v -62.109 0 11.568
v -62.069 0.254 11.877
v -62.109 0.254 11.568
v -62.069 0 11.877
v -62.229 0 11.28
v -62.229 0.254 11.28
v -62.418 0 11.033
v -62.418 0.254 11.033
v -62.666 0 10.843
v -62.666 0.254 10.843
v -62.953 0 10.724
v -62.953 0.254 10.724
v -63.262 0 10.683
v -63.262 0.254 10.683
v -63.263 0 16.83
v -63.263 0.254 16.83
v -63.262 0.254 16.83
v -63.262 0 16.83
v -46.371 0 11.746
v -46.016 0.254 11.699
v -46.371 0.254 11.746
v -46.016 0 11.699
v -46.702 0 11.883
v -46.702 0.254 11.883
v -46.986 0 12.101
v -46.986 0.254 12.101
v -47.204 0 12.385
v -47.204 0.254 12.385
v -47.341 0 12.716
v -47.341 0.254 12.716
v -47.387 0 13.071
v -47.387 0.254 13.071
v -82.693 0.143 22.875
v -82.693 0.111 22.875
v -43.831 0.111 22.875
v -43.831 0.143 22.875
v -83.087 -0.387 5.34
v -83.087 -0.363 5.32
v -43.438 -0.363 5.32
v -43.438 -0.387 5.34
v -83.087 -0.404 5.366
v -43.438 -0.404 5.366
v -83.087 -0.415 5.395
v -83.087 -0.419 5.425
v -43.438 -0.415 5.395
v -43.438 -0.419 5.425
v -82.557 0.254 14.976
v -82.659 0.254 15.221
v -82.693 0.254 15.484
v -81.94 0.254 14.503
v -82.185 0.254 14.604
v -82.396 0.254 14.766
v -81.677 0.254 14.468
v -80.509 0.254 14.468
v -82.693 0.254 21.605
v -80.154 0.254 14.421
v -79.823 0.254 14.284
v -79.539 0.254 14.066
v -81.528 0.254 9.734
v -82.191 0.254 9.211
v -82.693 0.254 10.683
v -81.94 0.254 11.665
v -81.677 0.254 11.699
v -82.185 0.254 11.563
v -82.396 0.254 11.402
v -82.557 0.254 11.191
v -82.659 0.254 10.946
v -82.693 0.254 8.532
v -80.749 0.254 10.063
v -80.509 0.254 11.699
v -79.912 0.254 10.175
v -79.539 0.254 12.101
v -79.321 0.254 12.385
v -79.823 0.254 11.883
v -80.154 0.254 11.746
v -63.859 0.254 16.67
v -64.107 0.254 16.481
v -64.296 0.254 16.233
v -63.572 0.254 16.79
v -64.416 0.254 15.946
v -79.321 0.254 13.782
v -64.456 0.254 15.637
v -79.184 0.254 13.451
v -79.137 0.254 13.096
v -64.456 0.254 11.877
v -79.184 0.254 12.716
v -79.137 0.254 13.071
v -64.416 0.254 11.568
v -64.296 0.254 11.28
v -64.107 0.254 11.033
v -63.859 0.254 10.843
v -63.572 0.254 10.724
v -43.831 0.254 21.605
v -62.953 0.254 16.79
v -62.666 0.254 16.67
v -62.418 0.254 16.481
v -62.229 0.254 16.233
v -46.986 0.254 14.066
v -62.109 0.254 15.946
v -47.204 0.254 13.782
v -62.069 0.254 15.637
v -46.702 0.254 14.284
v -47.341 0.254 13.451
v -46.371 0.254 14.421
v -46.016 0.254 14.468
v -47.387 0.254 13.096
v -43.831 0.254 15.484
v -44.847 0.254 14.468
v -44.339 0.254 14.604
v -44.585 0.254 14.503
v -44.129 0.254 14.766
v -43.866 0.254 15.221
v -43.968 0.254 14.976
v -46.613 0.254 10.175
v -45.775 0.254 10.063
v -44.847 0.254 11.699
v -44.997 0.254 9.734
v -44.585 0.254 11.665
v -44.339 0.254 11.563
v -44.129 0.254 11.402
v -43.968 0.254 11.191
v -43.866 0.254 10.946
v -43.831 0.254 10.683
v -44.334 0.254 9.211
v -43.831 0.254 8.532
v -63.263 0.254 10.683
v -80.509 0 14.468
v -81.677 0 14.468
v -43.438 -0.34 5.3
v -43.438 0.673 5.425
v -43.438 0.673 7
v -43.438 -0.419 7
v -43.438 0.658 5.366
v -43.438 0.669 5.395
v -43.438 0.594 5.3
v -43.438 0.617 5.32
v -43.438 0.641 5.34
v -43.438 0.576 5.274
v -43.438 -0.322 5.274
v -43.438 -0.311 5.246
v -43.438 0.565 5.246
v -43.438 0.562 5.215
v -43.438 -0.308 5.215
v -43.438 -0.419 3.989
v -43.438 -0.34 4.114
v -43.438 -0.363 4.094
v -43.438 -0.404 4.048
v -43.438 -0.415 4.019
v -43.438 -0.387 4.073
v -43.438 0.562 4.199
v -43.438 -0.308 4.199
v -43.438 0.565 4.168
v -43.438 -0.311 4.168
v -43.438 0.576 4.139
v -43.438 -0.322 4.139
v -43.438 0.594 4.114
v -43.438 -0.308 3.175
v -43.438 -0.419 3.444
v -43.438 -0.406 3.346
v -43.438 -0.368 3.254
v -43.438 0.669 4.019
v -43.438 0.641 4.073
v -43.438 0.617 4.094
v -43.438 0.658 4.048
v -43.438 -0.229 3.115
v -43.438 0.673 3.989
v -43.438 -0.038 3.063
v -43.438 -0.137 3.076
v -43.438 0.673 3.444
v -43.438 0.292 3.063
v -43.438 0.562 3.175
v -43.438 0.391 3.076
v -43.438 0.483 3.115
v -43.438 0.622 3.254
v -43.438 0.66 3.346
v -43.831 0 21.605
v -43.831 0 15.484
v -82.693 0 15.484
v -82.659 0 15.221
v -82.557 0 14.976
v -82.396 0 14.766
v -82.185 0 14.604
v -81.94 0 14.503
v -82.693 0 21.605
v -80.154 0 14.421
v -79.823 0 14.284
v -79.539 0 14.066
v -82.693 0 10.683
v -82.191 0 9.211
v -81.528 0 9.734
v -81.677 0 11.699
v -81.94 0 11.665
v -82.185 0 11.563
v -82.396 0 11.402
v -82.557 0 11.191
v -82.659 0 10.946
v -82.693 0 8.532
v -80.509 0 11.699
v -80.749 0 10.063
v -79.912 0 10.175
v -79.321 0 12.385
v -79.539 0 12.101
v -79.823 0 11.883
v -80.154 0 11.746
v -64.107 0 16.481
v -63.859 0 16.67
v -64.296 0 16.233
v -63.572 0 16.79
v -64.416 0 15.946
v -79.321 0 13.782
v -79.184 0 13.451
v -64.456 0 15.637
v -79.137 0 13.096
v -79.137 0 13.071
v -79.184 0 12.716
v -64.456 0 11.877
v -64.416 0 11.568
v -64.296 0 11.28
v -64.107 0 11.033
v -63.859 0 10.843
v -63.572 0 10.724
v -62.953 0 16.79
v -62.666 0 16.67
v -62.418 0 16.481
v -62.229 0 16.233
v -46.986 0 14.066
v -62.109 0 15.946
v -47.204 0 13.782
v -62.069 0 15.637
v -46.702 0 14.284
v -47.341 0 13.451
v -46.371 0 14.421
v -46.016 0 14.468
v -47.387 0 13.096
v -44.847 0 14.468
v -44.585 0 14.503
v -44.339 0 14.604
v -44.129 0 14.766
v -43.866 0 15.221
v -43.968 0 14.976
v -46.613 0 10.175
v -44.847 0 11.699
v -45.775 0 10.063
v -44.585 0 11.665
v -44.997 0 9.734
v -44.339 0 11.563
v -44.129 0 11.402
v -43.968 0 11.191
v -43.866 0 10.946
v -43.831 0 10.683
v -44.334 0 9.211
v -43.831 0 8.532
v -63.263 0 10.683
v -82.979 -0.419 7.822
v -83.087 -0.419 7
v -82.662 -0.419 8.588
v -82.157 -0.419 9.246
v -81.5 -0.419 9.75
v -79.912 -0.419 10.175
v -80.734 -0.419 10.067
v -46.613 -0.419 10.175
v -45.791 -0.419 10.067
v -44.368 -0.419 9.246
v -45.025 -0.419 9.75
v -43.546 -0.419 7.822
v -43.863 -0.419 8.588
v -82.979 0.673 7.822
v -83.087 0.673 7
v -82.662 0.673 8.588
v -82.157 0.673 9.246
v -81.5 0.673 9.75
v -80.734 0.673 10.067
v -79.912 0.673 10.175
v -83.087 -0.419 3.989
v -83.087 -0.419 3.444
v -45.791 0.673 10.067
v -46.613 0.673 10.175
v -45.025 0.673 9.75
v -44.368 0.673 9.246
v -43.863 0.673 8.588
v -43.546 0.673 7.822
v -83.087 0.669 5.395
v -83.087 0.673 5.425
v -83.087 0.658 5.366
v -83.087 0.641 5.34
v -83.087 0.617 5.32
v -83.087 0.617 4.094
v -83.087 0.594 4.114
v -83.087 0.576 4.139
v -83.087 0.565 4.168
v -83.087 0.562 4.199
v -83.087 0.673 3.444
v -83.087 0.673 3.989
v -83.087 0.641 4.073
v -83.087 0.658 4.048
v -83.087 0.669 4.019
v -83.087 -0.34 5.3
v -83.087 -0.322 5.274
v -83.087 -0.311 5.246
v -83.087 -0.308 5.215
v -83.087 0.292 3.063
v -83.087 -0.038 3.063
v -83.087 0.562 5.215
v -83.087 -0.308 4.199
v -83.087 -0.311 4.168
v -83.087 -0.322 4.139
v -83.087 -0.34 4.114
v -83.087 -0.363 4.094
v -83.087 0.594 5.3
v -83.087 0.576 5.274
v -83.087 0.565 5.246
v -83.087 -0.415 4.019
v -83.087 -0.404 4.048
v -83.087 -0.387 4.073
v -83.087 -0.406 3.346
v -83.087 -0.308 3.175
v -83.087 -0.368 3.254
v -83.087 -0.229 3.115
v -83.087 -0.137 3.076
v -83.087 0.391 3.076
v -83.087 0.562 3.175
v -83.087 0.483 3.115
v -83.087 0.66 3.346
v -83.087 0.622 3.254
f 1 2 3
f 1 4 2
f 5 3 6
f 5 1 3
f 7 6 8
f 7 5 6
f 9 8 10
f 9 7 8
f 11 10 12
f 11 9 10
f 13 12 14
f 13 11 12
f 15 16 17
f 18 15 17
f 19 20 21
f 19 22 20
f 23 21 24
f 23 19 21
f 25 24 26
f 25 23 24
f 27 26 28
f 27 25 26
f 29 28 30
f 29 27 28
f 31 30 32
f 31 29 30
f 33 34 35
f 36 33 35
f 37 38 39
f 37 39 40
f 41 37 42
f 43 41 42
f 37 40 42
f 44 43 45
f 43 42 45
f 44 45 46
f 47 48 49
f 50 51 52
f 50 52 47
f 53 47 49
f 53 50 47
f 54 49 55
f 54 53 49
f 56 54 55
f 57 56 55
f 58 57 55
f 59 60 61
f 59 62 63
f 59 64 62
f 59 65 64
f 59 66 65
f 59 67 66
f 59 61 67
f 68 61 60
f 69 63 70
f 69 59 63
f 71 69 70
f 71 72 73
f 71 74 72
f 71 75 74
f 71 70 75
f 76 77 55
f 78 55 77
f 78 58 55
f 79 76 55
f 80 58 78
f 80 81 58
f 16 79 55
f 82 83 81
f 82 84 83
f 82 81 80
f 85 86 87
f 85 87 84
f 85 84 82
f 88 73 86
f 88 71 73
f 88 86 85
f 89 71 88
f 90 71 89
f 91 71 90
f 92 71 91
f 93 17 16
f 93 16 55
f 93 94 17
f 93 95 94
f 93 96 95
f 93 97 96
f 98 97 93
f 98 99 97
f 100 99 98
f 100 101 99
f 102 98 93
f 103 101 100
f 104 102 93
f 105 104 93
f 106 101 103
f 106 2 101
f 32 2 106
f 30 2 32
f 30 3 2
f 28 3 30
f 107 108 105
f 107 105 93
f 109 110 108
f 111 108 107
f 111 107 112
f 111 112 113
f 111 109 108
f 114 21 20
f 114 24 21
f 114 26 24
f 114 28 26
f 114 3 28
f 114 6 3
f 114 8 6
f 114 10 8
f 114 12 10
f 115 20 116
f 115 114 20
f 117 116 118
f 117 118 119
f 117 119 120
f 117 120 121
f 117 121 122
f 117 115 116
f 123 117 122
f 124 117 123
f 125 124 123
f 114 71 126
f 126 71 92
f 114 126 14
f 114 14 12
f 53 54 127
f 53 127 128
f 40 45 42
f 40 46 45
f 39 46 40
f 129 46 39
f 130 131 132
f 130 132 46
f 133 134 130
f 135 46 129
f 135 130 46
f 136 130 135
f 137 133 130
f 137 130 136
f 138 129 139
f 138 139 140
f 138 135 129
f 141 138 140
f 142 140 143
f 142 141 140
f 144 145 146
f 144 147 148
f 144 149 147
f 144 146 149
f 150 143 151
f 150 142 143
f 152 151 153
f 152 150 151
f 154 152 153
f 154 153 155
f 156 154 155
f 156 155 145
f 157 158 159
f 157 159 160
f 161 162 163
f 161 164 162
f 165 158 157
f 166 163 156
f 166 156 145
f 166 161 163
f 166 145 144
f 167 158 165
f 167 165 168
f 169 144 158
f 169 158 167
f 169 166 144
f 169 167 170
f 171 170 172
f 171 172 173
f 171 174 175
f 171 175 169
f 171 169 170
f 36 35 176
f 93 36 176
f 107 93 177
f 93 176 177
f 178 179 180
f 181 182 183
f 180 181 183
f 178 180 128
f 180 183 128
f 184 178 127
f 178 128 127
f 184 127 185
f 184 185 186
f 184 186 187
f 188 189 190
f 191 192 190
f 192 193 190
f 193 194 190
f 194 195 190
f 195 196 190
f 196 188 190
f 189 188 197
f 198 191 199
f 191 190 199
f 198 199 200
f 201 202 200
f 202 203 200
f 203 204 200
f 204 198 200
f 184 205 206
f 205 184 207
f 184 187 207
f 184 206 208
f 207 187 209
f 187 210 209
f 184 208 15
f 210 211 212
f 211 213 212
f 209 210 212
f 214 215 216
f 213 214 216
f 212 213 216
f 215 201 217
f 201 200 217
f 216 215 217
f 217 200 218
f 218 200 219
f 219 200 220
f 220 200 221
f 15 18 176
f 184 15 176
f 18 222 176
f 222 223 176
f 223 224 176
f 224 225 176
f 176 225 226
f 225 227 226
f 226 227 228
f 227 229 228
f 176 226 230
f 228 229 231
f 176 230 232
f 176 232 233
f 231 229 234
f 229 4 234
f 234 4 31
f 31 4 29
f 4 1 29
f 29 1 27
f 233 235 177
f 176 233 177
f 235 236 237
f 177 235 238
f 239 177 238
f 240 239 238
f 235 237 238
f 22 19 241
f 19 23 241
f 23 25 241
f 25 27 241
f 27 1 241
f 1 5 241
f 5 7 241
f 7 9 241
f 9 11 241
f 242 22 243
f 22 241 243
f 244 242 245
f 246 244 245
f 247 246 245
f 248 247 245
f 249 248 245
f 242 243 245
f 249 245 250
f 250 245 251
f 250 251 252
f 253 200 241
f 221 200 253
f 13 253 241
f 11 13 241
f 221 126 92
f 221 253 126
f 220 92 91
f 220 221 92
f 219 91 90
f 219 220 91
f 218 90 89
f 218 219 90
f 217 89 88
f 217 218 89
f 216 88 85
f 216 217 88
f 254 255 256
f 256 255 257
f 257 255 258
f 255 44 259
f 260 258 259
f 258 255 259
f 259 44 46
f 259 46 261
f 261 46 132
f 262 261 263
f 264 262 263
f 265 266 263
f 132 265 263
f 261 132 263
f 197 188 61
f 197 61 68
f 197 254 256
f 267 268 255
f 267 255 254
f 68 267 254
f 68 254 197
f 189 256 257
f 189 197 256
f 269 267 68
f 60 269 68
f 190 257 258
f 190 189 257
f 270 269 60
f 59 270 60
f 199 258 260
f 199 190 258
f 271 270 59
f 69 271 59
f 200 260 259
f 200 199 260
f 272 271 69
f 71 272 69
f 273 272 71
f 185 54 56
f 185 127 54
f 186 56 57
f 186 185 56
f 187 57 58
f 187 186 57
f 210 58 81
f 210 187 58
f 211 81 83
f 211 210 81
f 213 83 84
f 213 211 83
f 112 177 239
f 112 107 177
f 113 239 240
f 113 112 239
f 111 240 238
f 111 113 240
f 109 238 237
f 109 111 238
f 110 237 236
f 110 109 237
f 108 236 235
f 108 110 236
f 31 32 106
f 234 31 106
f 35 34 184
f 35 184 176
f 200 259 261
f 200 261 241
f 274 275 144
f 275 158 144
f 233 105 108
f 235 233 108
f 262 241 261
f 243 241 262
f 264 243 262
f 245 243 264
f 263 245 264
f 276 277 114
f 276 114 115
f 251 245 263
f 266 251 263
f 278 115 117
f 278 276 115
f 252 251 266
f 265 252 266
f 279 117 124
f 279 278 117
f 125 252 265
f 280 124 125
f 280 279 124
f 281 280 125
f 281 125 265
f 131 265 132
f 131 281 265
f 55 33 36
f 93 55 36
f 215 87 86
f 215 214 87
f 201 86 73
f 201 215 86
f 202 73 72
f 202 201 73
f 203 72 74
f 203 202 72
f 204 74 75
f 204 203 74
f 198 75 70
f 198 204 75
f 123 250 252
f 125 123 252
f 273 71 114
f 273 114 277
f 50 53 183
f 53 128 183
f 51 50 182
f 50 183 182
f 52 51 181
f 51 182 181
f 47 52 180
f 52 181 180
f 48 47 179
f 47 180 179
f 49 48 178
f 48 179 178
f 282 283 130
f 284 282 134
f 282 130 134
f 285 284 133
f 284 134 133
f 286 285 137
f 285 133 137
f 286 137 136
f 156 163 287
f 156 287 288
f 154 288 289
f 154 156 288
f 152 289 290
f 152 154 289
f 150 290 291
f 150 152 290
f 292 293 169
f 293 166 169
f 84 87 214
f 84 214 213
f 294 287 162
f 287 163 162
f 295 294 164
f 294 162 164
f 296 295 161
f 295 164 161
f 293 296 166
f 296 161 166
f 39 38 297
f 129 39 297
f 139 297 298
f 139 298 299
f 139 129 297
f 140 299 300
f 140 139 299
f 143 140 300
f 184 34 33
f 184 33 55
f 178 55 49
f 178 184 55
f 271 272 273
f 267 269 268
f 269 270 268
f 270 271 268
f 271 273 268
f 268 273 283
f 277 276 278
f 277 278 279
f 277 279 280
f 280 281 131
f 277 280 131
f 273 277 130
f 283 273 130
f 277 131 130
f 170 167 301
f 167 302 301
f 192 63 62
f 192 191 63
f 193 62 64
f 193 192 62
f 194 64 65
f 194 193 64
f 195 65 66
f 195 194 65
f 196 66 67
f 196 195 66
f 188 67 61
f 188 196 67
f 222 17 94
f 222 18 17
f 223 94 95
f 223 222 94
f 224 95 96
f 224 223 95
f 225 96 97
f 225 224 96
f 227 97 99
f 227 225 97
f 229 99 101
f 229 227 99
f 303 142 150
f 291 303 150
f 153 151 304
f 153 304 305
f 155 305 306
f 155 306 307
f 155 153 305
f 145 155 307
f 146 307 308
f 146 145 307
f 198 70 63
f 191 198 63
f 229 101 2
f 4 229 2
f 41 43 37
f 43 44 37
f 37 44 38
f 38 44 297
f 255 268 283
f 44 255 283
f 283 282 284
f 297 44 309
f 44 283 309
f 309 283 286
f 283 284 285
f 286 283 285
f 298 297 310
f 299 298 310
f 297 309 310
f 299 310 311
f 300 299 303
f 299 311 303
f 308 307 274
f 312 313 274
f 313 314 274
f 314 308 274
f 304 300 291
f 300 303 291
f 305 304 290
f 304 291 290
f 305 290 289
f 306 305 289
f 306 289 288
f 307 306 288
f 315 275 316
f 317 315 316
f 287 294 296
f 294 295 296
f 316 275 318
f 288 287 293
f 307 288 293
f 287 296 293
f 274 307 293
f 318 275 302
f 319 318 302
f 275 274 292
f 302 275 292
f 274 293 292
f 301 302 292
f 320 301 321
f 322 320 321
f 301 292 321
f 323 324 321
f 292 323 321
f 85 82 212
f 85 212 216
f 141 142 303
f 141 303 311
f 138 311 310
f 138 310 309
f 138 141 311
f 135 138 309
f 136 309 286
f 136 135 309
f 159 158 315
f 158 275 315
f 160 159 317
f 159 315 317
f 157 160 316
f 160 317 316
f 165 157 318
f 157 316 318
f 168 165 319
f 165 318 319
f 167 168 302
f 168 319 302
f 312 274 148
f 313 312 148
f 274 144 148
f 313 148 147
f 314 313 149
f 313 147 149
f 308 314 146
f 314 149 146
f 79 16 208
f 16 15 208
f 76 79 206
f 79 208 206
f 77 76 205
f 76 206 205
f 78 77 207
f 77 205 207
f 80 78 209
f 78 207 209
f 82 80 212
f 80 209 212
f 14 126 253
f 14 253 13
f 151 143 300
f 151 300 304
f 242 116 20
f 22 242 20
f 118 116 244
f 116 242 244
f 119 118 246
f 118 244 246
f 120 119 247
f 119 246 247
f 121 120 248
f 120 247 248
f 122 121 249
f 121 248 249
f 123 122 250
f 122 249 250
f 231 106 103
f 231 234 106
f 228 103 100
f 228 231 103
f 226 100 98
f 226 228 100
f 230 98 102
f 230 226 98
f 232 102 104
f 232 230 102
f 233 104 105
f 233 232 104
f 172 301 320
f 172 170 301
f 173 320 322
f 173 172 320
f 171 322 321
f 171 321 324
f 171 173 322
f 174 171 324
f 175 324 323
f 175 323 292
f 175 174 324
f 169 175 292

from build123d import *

# Parameters (mm, degrees)
SKETCH1_W           = 38.862
SKETCH1_H           = 19.812
BOSS_EXTRUDE1_DEPTH = 0.254
CHAMFER1_SIZE       = 1.27
CHAMFER1_SIZE2      = 0.111110603
CHAMFER2_SIZE       = 1.27
CHAMFER2_SIZE2      = 0.111110603
SKETCH2_W           = 38.862
SKETCH2_H           = 7.112
BOSS_EXTRUDE2_DEPTH = 1.0922
MOVE_FACE1_BY       = 0.3937
MOVE_FACE1_2_BY     = 0.3937
FILLET1_R           = 3.175
FILLET2_R           = 0.381
SKETCH3_W           = 1.27
SKETCH3_H           = 0.642734604
CUT_EXTRUDE1_DEPTH  = 46.780069848
FILLET3_R           = 0.127
FILLET4_R           = 0.127
CUT_EXTRUDE2_DEPTH  = 87.18132095
FILLET5_R           = 1.3716
FILLET6_R           = 1.016
SKETCH5_W           = 2.3876
SKETCH5_H           = 6.1468
CUT_EXTRUDE3_DEPTH  = 87.18132095
FILLET7_R           = 1.1938


# Some blends are built 0.0001 mm under size
with BuildPart() as part:
    # Sketch1 → Boss-Extrude1 (new body)
    with BuildSketch(Plane(origin=(0, 0, 0), x_dir=(1, 0, 0), z_dir=(0, 1, 0))):
        with Locations((-63.262484365, -12.969463084)):
            Rectangle(SKETCH1_W, SKETCH1_H)
    extrude(amount=BOSS_EXTRUDE1_DEPTH)

    # Chamfer1
    chamfer1_edges = [part.edges().sort_by_distance(p)[0] for p in [
        (-63.262484365, 0.254, 22.875463084),
    ]]
    chamfer1_side = [part.faces().sort_by_distance(p)[0] for p in [
        (-63.262484365, 0.254, 12.969463084),
    ]]
    chamfer(chamfer1_edges, length=CHAMFER1_SIZE, length2=CHAMFER1_SIZE2, reference=chamfer1_side[0])

    # Chamfer2
    chamfer2_edges = [part.edges().sort_by_distance(p)[0] for p in [
        (-63.262484365, 0, 22.875463084),
    ]]
    chamfer2_side = [part.faces().sort_by_distance(p)[0] for p in [
        (-63.262484365, 0, 12.969463084),
    ]]
    chamfer(chamfer2_edges, length=CHAMFER2_SIZE, length2=CHAMFER2_SIZE2, reference=chamfer2_side[0])


with BuildPart() as body_2:
    # Sketch2 → Boss-Extrude2 (new body)
    with BuildSketch(Plane(origin=(0, 0.254, 0), x_dir=(-1, 0, 0), z_dir=(0, 1, 0))):
        with Locations((63.262484365, 6.619463084)):
            Rectangle(SKETCH2_W, SKETCH2_H)
    extrude(amount=BOSS_EXTRUDE2_DEPTH)


with BuildPart() as body_2_1:
    # Body-Move/Copy1: moved
    add(body_2.part.moved(Location((0, -0.6731, 0))))

    # Move Face1: a face moved outward by 0.3937
    extrude(body_2_1.faces().sort_by_distance((-82.693484365, 0.127, 6.619463084))[0], amount=MOVE_FACE1_BY, dir=(-1, 0, 0))

    # Move Face1 2: a face moved outward by 0.3937
    extrude(body_2_1.faces().sort_by_distance((-43.831484365, 0.127, 6.619463084))[0], amount=MOVE_FACE1_2_BY, dir=(1, 0, 0))

    # Fillet1
    fillet1_edges = [body_2_1.edges().sort_by_distance(p)[0] for p in [
        (-43.437784365, 0.127, 10.175463084),
        (-83.087184365, 0.127, 10.175463084),
    ]]
    fillet(fillet1_edges, radius=FILLET1_R)


with BuildPart() as part_1:
    add(part.part)

    # Combine1: union body 2
    add(body_2_1.part)

    # Fillet2
    fillet2_edges = [part_1.edges().sort_by_distance(p)[0] for p in [
        (-63.262484365, -0.4191, 3.063463084),
        (-63.262484365, 0.6731, 3.063463084),
    ]]
    fillet(fillet2_edges, radius=FILLET2_R)

    # Sketch3 → Cut-Extrude1 (cut, through all)
    with BuildSketch(Plane(origin=(-43.437784365, 0, 0), x_dir=(0, 0, -1), z_dir=(1, 0, 0))):
        with Locations((-4.706856109, -0.628874986)):
            Rectangle(SKETCH3_W, SKETCH3_H)
        with Locations((-4.706856109, 0.882874986)):
            Rectangle(SKETCH3_W, SKETCH3_H)
    extrude(amount=-CUT_EXTRUDE1_DEPTH, mode=Mode.SUBTRACT)

    # Fillet3
    # the kernel refuses this fillet: 0.127 mm, written as the material it adds along each edge
    with BuildSketch(Plane(origin=(-43.437784365, -0.307507684, 5.341856109), x_dir=(0, 0, -1), z_dir=(-1, 0, 0))) as fillet3_piece_1_section:
        with BuildLine():
            CenterArc((FILLET3_R, FILLET3_R), FILLET3_R, 180, 90)
            Line((0, FILLET3_R), (0, 0))
            Line((0, 0), (FILLET3_R, 0))
        make_face()
    fillet3_piece_1 = extrude(amount=39.6494, mode=Mode.PRIVATE)
    fillet3_piece_1 = split(fillet3_piece_1, bisect_by=Plane(origin=(-63.262484365, -0.4191, 5.312781513), z_dir=(0, 1, 0)), keep=Keep.TOP, mode=Mode.PRIVATE)
    add(fillet3_piece_1)
    with BuildSketch(Plane(origin=(-43.437784365, -0.307507684, 4.071856109), x_dir=(0, -1, 0), z_dir=(-1, 0, 0))) as fillet3_piece_2_section:
        with BuildLine():
            CenterArc((FILLET3_R, FILLET3_R), FILLET3_R, 180, 90)
            Line((0, FILLET3_R), (0, 0))
            Line((0, 0), (FILLET3_R, 0))
        make_face()
    fillet3_piece_2 = extrude(amount=39.6494, mode=Mode.PRIVATE)
    fillet3_piece_2 = split(fillet3_piece_2, bisect_by=Plane(origin=(-63.262484365, -0.4191, 4.100930704), z_dir=(0, 1, 0)), keep=Keep.TOP, mode=Mode.PRIVATE)
    add(fillet3_piece_2)
    with BuildSketch(Plane(origin=(-43.437784365, 0.561507684, 5.341856109), x_dir=(0, 1, 0), z_dir=(-1, 0, 0))) as fillet3_piece_3_section:
        with BuildLine():
            CenterArc((FILLET3_R, FILLET3_R), FILLET3_R, 180, 90)
            Line((0, FILLET3_R), (0, 0))
            Line((0, 0), (FILLET3_R, 0))
        make_face()
    fillet3_piece_3 = extrude(amount=39.6494, mode=Mode.PRIVATE)
    fillet3_piece_3 = split(fillet3_piece_3, bisect_by=Plane(origin=(-63.262484365, 0.6731, 5.312781513), z_dir=(0, -1, 0)), keep=Keep.TOP, mode=Mode.PRIVATE)
    add(fillet3_piece_3)
    with BuildSketch(Plane(origin=(-43.437784365, 0.561507684, 4.071856109), x_dir=(0, 0, 1), z_dir=(-1, 0, 0))) as fillet3_piece_4_section:
        with BuildLine():
            CenterArc((FILLET3_R, FILLET3_R), FILLET3_R, 180, 90)
            Line((0, FILLET3_R), (0, 0))
            Line((0, 0), (FILLET3_R, 0))
        make_face()
    fillet3_piece_4 = extrude(amount=39.6494, mode=Mode.PRIVATE)
    fillet3_piece_4 = split(fillet3_piece_4, bisect_by=Plane(origin=(-63.262484365, 0.6731, 4.100930704), z_dir=(0, -1, 0)), keep=Keep.TOP, mode=Mode.PRIVATE)
    add(fillet3_piece_4)

    # Fillet4
    fillet4_edges = [part_1.edges().sort_by_distance(p)[0] for p in [
        (-63.262484365, -0.4191, 5.340918011),
        (-63.262484365, -0.4191, 4.072794206),
        (-63.262484365, 0.6731, 5.340918011),
        (-63.262484365, 0.6731, 4.072794206),
    ]]
    fillet(fillet4_edges, radius=FILLET4_R)

    # Sketch4 → Cut-Extrude2 (cut, through all)
    with BuildSketch(Plane(origin=(0, 0.254, 0), x_dir=(-1, 0, 0), z_dir=(0, 1, 0))):
        Polygon((82.693484365, 11.699463084), (79.137484365, 11.699463084), (79.137484365, 14.468063084), (84.344362943, 14.468063084), (84.344362943, 11.699463084), align=None)
        Polygon((47.387484365, 14.468063084), (42.180605788, 14.468063084), (42.180605788, 11.699463084), (43.831484365, 11.699463084), (47.387484365, 11.699463084), align=None)
    extrude(amount=-CUT_EXTRUDE2_DEPTH, mode=Mode.SUBTRACT)

    # Fillet5
    fillet5_edges = [part_1.edges().sort_by_distance(p)[0] for p in [
        (-79.137484365, 0.127, 11.699463084),
        (-79.137484365, 0.127, 14.468063084),
        (-47.387484365, 0.127, 14.468063084),
        (-47.387484365, 0.127, 11.699463084),
    ]]
    fillet(fillet5_edges, radius=FILLET5_R)

    # Fillet6
    fillet6_edges = [part_1.edges().sort_by_distance(p)[0] for p in [
        (-82.693484365, 0.127, 11.699463084),
        (-82.693484365, 0.127, 14.468063084),
        (-43.831484365, 0.127, 11.699463084),
        (-43.831484365, 0.127, 14.468063084),
    ]]
    fillet(fillet6_edges, radius=FILLET6_R)

    # Sketch5 → Cut-Extrude3 (cut, through all)
    with BuildSketch(Plane(origin=(0, 0.254, 0), x_dir=(1, 0, 0), z_dir=(0, 1, 0))):
        with Locations((-63.262484365, -13.756863084)):
            Rectangle(SKETCH5_W, SKETCH5_H)
    extrude(amount=-CUT_EXTRUDE3_DEPTH, mode=Mode.SUBTRACT)

    # Fillet7
    fillet7_edges = [part_1.edges().sort_by_distance(p)[0] for p in [
        (-64.456284365, 0.127, 16.830263084),
        (-62.068684365, 0.127, 16.830263084),
        (-62.068684365, 0.127, 10.683463084),
        (-64.456284365, 0.127, 10.683463084),
    ]]
    fillet(fillet7_edges, radius=FILLET7_R - 0.0001)  # a hair under: the kernel refuses the full size


solid = part_1.part
